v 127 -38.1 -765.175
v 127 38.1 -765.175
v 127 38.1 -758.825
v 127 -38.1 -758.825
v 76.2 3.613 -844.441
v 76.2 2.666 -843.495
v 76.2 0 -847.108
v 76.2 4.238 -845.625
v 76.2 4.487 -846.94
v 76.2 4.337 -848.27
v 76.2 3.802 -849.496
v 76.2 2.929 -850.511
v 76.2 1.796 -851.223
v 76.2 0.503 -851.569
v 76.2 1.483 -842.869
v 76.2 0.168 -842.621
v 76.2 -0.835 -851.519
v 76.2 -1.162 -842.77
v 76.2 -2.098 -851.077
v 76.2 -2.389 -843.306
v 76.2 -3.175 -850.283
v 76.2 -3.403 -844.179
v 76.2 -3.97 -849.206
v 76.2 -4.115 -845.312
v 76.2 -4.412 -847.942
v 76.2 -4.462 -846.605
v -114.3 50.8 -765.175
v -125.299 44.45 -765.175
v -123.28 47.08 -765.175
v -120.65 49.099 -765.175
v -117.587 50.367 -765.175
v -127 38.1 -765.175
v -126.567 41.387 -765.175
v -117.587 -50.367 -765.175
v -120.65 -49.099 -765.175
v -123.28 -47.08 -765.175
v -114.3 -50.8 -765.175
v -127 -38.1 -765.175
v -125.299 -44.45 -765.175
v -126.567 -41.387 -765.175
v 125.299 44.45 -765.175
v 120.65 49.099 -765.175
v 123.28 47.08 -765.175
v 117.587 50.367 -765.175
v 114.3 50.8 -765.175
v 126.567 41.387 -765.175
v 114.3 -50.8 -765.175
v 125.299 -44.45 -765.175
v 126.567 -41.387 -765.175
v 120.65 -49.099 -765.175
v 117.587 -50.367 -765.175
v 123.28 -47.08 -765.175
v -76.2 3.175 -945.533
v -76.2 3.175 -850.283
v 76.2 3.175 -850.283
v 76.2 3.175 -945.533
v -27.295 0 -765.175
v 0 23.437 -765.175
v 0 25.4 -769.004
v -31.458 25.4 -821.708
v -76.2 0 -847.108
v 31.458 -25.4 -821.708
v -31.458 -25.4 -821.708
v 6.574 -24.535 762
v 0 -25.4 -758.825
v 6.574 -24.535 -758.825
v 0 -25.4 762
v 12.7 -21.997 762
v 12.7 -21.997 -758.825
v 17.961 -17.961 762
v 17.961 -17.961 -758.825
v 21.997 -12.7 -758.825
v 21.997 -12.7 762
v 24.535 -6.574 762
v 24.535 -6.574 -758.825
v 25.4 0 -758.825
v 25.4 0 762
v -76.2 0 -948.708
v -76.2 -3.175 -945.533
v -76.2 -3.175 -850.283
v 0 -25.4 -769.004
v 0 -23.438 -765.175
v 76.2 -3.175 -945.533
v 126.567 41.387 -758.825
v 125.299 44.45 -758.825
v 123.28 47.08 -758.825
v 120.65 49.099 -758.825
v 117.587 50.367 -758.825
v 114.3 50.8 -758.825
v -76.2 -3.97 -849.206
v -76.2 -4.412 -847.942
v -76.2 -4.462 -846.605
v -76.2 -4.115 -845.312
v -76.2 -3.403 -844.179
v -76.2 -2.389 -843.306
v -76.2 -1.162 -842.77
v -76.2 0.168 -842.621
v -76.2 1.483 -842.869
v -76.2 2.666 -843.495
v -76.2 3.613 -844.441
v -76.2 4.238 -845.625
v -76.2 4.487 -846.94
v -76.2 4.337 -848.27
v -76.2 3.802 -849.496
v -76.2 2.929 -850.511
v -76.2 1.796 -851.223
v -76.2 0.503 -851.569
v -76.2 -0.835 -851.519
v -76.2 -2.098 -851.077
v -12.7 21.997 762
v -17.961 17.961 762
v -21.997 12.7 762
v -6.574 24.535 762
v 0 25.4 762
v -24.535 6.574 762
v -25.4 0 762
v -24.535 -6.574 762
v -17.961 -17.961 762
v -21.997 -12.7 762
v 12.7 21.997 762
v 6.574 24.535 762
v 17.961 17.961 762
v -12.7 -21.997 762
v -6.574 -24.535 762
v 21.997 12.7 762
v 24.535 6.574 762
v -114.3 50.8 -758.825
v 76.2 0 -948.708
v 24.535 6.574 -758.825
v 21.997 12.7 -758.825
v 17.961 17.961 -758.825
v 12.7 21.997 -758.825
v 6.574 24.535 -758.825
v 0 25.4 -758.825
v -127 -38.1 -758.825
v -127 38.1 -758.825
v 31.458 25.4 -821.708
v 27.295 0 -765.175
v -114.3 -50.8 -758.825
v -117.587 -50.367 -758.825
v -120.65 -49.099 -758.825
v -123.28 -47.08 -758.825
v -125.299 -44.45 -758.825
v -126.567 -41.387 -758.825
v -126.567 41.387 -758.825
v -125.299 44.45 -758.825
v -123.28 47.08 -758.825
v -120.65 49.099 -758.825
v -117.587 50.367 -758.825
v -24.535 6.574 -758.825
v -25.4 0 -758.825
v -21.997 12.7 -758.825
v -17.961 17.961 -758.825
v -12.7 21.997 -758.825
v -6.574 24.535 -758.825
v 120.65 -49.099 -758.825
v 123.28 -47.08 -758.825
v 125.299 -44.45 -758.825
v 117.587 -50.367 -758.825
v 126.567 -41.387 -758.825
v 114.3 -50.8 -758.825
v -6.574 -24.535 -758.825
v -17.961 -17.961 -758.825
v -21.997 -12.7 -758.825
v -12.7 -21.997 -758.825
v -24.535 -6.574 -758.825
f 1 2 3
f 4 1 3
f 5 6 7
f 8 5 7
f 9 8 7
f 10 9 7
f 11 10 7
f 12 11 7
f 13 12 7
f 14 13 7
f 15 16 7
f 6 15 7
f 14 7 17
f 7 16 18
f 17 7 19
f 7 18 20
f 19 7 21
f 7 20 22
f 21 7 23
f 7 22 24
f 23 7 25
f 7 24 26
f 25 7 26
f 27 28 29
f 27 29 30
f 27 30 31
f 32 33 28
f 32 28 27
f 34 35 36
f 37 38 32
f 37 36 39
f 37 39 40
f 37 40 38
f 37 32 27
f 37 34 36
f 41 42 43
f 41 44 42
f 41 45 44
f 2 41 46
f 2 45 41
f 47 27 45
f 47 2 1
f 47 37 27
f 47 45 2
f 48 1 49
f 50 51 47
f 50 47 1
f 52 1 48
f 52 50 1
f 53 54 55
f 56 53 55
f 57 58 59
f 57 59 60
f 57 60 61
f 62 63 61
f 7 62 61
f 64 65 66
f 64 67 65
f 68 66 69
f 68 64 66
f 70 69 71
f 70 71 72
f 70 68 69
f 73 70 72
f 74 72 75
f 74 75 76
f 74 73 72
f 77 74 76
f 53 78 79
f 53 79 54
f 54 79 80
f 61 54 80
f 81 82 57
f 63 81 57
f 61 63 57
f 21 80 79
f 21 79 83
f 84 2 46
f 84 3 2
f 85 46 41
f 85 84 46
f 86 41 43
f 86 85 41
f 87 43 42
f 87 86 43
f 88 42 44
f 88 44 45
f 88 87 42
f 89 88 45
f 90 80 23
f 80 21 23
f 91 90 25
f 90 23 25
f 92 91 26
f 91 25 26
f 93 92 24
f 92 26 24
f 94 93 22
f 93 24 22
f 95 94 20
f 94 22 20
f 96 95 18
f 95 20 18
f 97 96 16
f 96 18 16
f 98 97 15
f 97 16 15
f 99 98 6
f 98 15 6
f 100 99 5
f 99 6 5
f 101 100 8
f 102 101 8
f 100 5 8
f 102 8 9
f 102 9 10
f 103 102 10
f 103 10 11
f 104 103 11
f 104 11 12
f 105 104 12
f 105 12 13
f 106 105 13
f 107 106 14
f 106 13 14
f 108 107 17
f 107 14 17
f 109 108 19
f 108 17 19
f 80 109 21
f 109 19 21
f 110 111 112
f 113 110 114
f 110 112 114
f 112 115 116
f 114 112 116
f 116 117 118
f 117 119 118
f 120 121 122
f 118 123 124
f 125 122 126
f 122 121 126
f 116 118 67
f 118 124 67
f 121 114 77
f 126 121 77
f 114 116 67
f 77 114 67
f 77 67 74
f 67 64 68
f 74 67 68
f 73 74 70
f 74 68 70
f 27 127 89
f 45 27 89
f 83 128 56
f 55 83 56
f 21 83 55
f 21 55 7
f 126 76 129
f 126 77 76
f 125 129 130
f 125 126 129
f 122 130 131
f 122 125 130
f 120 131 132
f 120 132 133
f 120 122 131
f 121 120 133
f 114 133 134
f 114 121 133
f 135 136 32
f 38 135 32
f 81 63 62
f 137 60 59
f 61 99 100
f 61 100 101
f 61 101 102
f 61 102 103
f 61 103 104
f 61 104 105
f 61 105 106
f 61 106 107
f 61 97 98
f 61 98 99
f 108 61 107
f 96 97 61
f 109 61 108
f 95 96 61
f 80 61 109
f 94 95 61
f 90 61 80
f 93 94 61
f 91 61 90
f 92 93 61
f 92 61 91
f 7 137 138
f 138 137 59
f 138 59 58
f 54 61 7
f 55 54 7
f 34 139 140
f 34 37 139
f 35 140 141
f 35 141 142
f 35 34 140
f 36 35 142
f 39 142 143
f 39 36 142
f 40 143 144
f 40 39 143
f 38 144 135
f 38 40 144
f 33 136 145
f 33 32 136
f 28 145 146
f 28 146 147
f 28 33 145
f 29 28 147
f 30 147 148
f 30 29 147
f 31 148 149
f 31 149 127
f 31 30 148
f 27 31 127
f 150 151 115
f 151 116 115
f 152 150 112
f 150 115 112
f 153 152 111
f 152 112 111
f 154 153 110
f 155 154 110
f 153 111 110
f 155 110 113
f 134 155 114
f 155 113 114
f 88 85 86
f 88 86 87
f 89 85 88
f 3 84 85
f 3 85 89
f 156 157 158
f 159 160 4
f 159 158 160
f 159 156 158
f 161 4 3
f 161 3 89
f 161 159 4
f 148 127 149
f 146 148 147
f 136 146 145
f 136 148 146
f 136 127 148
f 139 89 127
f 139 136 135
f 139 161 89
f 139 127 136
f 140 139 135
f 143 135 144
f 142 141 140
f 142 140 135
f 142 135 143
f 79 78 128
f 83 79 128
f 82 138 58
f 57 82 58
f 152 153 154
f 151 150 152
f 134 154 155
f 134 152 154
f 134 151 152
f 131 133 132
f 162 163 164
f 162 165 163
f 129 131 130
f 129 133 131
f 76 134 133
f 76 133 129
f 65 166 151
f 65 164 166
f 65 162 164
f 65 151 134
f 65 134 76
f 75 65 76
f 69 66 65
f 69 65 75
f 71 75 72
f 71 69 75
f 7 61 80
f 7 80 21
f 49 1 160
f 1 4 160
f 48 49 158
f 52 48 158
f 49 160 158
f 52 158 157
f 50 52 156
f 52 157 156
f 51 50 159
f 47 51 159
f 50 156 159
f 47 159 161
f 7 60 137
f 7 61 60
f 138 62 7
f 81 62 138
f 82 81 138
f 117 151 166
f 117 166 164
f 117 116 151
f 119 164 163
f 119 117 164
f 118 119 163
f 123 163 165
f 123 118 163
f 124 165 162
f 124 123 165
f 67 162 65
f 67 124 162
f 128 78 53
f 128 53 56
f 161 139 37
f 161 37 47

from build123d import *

# Parameters (mm, degrees)
F0_W       = 50.8
F0_H       = 1520.825
F1_DEPTH   = 25.4
F2_R       = 25.39999
F0_W_2     = 152.4
F0_H_2     = 101.6
F3_DEPTH   = 3.175
F4_DEPTH   = 25.4
F5_C1_SIZE = 25.4
F5_C2_SIZE = 25.3999
F5_C3_SIZE = 25.4
F5_C4_SIZE = 25.3999
F5_C5_SIZE = 25.4
F5_C6_SIZE = 25.3999
F6_SIZE    = 3.17499
F0_H_3     = 3.175
F7_DEPTH   = 50.8
F8_R       = 12.7
F9_SIZE    = 3.17499
F9_FACE_W  = 152.4
F9_FACE_H  = 4.4901139184


# Not quite as in the source:
# - a fillet or chamfer is up to 0.001 mm smaller than in the source, because OpenCascade refuses the exact size


with BuildPart() as f1:
    # F0 (on Front) → F1 (new body, symmetric)
    with BuildSketch(Plane.XZ):
        with Locations((0, 1.5875)):
            Rectangle(F0_W, F0_H)
    extrude(amount=F1_DEPTH, both=True)

    # F2 (radius 25.4 in the source; OpenCascade refuses exactly that, so slightly less here)
    f2_edges = [f1.edges().sort_by_distance(p)[0] for p in [
        (-25.4, -25.4, 1.5875),
        (25.4, -25.4, 1.5875),
        (25.4, 25.4, 1.5875),
        (-25.4, 25.4, 1.5875),
    ]]
    fillet(f2_edges, radius=F2_R)


with BuildPart() as f3:
    # F0 (on Front) → F3 (new body, symmetric)
    with BuildSketch(Plane.XZ):
        with Locations((0, -897.9075126523)):
            Rectangle(F0_W_2, F0_H_2)
    extrude(amount=F3_DEPTH, both=True)

    # F6 (size 3.175 in the source; OpenCascade refuses exactly that, so slightly less here)
    f6_edges = [f3.edges().sort_by_distance(p)[0] for p in [
        (0, 3.175, -948.707513),
        (0, -3.175, -948.707513),
    ]]
    chamfer(f6_edges, length=F6_SIZE)

    # F9 (size 3.175 in the source; OpenCascade refuses exactly that, so slightly less here)
    f9_edges = [f3.edges().sort_by_distance(p)[0] for p in [
        (0, 3.175, -847.107513),
        (0, -3.175, -847.107513),
    ]]
    chamfer(f9_edges, length=F9_SIZE)


with BuildPart() as f4:
    # F0 (on Front) → F4 (new body, symmetric)
    with BuildSketch(Plane.XZ):
        Polygon((27.2951323446, -765.175), (-27.2951323446, -765.175), (-76.2, -847.1075126523), (76.2, -847.1075126523), align=None)
    extrude(amount=F4_DEPTH, both=True)

    # F5: chamfer of 25.4 on 6 edges, made by hand

    # F5_c1
    f5_c1_edges = [f4.edges().sort_by_distance(p)[0] for p in [
        (51.7475661723, 25.4, -806.1412563261),
    ]]
    chamfer(f5_c1_edges, length=F5_C1_SIZE)

    # F5_c2 (size 25.4 in the source; OpenCascade refuses exactly that, so slightly less here)
    f5_c2_edges = [f4.edges().sort_by_distance(p)[0] for p in [
        (51.7475661723, -25.4, -806.1412563261),
    ]]
    chamfer(f5_c2_edges, length=F5_C2_SIZE)

    # F5_c3
    f5_c3_edges = [f4.edges().sort_by_distance(p)[0] for p in [
        (-14.7903490716, 25.4, -847.1075126523),
    ]]
    chamfer(f5_c3_edges, length=F5_C3_SIZE)

    # F5_c4 (size 25.4 in the source; OpenCascade refuses exactly that, so slightly less here)
    f5_c4_edges = [f4.edges().sort_by_distance(p)[0] for p in [
        (-14.7902908419, -25.4, -847.1075126523),
    ]]
    chamfer(f5_c4_edges, length=F5_C4_SIZE)

    # F5_c5
    f5_c5_edges = [f4.edges().sort_by_distance(p)[0] for p in [
        (-44.1670367937, 25.4, -793.4412563261),
    ]]
    chamfer(f5_c5_edges, length=F5_C5_SIZE)

    # F5_c6 (size 25.4 in the source; OpenCascade refuses exactly that, so slightly less here)
    f5_c6_edges = [f4.edges().sort_by_distance(p)[0] for p in [
        (-44.1670666383, -25.4, -793.4413063261),
    ]]
    chamfer(f5_c6_edges, length=F5_C6_SIZE)


with BuildPart() as f7:
    # F0 (on Front) → F7 (new body, symmetric)
    with BuildSketch(Plane.XZ):
        Polygon((127, -758.825), (25.4, -758.825), (25.4, -762), (27.2951323446, -765.175), (127, -765.175), align=None)
        Polygon((-25.4, -762), (-25.4, -758.825), (-127, -758.825), (-127, -765.175), (-27.2951323446, -765.175), align=None)
        with Locations((0, -760.4125)):
            Rectangle(F0_W, F0_H_3)
        Polygon((25.4, -762), (-25.4, -762), (-27.2951323446, -765.175), (27.2951323446, -765.175), align=None)
    extrude(amount=F7_DEPTH, both=True)

    # F8
    f8_edges = [f7.edges().sort_by_distance(p)[0] for p in [
        (127, 50.8, -762),
        (127, -50.8, -762),
        (-127, -50.8, -762),
        (-127, 50.8, -762),
    ]]
    fillet(f8_edges, radius=F8_R)


with BuildPart() as f10:
    # F9_face (on face) → F10 (revolve)
    with BuildSketch(Plane(origin=(0, -1.587505, -848.6950076523), x_dir=(1, 0, 0), z_dir=(0, -0.7071067812, 0.7071067812))):
        Rectangle(F9_FACE_W, F9_FACE_H)
    revolve(axis=Axis((0, 0, -847.1075126523), (-1, 0, 0)))


solid = Compound([f1.part, f3.part, f4.part, f7.part, f10.part])
